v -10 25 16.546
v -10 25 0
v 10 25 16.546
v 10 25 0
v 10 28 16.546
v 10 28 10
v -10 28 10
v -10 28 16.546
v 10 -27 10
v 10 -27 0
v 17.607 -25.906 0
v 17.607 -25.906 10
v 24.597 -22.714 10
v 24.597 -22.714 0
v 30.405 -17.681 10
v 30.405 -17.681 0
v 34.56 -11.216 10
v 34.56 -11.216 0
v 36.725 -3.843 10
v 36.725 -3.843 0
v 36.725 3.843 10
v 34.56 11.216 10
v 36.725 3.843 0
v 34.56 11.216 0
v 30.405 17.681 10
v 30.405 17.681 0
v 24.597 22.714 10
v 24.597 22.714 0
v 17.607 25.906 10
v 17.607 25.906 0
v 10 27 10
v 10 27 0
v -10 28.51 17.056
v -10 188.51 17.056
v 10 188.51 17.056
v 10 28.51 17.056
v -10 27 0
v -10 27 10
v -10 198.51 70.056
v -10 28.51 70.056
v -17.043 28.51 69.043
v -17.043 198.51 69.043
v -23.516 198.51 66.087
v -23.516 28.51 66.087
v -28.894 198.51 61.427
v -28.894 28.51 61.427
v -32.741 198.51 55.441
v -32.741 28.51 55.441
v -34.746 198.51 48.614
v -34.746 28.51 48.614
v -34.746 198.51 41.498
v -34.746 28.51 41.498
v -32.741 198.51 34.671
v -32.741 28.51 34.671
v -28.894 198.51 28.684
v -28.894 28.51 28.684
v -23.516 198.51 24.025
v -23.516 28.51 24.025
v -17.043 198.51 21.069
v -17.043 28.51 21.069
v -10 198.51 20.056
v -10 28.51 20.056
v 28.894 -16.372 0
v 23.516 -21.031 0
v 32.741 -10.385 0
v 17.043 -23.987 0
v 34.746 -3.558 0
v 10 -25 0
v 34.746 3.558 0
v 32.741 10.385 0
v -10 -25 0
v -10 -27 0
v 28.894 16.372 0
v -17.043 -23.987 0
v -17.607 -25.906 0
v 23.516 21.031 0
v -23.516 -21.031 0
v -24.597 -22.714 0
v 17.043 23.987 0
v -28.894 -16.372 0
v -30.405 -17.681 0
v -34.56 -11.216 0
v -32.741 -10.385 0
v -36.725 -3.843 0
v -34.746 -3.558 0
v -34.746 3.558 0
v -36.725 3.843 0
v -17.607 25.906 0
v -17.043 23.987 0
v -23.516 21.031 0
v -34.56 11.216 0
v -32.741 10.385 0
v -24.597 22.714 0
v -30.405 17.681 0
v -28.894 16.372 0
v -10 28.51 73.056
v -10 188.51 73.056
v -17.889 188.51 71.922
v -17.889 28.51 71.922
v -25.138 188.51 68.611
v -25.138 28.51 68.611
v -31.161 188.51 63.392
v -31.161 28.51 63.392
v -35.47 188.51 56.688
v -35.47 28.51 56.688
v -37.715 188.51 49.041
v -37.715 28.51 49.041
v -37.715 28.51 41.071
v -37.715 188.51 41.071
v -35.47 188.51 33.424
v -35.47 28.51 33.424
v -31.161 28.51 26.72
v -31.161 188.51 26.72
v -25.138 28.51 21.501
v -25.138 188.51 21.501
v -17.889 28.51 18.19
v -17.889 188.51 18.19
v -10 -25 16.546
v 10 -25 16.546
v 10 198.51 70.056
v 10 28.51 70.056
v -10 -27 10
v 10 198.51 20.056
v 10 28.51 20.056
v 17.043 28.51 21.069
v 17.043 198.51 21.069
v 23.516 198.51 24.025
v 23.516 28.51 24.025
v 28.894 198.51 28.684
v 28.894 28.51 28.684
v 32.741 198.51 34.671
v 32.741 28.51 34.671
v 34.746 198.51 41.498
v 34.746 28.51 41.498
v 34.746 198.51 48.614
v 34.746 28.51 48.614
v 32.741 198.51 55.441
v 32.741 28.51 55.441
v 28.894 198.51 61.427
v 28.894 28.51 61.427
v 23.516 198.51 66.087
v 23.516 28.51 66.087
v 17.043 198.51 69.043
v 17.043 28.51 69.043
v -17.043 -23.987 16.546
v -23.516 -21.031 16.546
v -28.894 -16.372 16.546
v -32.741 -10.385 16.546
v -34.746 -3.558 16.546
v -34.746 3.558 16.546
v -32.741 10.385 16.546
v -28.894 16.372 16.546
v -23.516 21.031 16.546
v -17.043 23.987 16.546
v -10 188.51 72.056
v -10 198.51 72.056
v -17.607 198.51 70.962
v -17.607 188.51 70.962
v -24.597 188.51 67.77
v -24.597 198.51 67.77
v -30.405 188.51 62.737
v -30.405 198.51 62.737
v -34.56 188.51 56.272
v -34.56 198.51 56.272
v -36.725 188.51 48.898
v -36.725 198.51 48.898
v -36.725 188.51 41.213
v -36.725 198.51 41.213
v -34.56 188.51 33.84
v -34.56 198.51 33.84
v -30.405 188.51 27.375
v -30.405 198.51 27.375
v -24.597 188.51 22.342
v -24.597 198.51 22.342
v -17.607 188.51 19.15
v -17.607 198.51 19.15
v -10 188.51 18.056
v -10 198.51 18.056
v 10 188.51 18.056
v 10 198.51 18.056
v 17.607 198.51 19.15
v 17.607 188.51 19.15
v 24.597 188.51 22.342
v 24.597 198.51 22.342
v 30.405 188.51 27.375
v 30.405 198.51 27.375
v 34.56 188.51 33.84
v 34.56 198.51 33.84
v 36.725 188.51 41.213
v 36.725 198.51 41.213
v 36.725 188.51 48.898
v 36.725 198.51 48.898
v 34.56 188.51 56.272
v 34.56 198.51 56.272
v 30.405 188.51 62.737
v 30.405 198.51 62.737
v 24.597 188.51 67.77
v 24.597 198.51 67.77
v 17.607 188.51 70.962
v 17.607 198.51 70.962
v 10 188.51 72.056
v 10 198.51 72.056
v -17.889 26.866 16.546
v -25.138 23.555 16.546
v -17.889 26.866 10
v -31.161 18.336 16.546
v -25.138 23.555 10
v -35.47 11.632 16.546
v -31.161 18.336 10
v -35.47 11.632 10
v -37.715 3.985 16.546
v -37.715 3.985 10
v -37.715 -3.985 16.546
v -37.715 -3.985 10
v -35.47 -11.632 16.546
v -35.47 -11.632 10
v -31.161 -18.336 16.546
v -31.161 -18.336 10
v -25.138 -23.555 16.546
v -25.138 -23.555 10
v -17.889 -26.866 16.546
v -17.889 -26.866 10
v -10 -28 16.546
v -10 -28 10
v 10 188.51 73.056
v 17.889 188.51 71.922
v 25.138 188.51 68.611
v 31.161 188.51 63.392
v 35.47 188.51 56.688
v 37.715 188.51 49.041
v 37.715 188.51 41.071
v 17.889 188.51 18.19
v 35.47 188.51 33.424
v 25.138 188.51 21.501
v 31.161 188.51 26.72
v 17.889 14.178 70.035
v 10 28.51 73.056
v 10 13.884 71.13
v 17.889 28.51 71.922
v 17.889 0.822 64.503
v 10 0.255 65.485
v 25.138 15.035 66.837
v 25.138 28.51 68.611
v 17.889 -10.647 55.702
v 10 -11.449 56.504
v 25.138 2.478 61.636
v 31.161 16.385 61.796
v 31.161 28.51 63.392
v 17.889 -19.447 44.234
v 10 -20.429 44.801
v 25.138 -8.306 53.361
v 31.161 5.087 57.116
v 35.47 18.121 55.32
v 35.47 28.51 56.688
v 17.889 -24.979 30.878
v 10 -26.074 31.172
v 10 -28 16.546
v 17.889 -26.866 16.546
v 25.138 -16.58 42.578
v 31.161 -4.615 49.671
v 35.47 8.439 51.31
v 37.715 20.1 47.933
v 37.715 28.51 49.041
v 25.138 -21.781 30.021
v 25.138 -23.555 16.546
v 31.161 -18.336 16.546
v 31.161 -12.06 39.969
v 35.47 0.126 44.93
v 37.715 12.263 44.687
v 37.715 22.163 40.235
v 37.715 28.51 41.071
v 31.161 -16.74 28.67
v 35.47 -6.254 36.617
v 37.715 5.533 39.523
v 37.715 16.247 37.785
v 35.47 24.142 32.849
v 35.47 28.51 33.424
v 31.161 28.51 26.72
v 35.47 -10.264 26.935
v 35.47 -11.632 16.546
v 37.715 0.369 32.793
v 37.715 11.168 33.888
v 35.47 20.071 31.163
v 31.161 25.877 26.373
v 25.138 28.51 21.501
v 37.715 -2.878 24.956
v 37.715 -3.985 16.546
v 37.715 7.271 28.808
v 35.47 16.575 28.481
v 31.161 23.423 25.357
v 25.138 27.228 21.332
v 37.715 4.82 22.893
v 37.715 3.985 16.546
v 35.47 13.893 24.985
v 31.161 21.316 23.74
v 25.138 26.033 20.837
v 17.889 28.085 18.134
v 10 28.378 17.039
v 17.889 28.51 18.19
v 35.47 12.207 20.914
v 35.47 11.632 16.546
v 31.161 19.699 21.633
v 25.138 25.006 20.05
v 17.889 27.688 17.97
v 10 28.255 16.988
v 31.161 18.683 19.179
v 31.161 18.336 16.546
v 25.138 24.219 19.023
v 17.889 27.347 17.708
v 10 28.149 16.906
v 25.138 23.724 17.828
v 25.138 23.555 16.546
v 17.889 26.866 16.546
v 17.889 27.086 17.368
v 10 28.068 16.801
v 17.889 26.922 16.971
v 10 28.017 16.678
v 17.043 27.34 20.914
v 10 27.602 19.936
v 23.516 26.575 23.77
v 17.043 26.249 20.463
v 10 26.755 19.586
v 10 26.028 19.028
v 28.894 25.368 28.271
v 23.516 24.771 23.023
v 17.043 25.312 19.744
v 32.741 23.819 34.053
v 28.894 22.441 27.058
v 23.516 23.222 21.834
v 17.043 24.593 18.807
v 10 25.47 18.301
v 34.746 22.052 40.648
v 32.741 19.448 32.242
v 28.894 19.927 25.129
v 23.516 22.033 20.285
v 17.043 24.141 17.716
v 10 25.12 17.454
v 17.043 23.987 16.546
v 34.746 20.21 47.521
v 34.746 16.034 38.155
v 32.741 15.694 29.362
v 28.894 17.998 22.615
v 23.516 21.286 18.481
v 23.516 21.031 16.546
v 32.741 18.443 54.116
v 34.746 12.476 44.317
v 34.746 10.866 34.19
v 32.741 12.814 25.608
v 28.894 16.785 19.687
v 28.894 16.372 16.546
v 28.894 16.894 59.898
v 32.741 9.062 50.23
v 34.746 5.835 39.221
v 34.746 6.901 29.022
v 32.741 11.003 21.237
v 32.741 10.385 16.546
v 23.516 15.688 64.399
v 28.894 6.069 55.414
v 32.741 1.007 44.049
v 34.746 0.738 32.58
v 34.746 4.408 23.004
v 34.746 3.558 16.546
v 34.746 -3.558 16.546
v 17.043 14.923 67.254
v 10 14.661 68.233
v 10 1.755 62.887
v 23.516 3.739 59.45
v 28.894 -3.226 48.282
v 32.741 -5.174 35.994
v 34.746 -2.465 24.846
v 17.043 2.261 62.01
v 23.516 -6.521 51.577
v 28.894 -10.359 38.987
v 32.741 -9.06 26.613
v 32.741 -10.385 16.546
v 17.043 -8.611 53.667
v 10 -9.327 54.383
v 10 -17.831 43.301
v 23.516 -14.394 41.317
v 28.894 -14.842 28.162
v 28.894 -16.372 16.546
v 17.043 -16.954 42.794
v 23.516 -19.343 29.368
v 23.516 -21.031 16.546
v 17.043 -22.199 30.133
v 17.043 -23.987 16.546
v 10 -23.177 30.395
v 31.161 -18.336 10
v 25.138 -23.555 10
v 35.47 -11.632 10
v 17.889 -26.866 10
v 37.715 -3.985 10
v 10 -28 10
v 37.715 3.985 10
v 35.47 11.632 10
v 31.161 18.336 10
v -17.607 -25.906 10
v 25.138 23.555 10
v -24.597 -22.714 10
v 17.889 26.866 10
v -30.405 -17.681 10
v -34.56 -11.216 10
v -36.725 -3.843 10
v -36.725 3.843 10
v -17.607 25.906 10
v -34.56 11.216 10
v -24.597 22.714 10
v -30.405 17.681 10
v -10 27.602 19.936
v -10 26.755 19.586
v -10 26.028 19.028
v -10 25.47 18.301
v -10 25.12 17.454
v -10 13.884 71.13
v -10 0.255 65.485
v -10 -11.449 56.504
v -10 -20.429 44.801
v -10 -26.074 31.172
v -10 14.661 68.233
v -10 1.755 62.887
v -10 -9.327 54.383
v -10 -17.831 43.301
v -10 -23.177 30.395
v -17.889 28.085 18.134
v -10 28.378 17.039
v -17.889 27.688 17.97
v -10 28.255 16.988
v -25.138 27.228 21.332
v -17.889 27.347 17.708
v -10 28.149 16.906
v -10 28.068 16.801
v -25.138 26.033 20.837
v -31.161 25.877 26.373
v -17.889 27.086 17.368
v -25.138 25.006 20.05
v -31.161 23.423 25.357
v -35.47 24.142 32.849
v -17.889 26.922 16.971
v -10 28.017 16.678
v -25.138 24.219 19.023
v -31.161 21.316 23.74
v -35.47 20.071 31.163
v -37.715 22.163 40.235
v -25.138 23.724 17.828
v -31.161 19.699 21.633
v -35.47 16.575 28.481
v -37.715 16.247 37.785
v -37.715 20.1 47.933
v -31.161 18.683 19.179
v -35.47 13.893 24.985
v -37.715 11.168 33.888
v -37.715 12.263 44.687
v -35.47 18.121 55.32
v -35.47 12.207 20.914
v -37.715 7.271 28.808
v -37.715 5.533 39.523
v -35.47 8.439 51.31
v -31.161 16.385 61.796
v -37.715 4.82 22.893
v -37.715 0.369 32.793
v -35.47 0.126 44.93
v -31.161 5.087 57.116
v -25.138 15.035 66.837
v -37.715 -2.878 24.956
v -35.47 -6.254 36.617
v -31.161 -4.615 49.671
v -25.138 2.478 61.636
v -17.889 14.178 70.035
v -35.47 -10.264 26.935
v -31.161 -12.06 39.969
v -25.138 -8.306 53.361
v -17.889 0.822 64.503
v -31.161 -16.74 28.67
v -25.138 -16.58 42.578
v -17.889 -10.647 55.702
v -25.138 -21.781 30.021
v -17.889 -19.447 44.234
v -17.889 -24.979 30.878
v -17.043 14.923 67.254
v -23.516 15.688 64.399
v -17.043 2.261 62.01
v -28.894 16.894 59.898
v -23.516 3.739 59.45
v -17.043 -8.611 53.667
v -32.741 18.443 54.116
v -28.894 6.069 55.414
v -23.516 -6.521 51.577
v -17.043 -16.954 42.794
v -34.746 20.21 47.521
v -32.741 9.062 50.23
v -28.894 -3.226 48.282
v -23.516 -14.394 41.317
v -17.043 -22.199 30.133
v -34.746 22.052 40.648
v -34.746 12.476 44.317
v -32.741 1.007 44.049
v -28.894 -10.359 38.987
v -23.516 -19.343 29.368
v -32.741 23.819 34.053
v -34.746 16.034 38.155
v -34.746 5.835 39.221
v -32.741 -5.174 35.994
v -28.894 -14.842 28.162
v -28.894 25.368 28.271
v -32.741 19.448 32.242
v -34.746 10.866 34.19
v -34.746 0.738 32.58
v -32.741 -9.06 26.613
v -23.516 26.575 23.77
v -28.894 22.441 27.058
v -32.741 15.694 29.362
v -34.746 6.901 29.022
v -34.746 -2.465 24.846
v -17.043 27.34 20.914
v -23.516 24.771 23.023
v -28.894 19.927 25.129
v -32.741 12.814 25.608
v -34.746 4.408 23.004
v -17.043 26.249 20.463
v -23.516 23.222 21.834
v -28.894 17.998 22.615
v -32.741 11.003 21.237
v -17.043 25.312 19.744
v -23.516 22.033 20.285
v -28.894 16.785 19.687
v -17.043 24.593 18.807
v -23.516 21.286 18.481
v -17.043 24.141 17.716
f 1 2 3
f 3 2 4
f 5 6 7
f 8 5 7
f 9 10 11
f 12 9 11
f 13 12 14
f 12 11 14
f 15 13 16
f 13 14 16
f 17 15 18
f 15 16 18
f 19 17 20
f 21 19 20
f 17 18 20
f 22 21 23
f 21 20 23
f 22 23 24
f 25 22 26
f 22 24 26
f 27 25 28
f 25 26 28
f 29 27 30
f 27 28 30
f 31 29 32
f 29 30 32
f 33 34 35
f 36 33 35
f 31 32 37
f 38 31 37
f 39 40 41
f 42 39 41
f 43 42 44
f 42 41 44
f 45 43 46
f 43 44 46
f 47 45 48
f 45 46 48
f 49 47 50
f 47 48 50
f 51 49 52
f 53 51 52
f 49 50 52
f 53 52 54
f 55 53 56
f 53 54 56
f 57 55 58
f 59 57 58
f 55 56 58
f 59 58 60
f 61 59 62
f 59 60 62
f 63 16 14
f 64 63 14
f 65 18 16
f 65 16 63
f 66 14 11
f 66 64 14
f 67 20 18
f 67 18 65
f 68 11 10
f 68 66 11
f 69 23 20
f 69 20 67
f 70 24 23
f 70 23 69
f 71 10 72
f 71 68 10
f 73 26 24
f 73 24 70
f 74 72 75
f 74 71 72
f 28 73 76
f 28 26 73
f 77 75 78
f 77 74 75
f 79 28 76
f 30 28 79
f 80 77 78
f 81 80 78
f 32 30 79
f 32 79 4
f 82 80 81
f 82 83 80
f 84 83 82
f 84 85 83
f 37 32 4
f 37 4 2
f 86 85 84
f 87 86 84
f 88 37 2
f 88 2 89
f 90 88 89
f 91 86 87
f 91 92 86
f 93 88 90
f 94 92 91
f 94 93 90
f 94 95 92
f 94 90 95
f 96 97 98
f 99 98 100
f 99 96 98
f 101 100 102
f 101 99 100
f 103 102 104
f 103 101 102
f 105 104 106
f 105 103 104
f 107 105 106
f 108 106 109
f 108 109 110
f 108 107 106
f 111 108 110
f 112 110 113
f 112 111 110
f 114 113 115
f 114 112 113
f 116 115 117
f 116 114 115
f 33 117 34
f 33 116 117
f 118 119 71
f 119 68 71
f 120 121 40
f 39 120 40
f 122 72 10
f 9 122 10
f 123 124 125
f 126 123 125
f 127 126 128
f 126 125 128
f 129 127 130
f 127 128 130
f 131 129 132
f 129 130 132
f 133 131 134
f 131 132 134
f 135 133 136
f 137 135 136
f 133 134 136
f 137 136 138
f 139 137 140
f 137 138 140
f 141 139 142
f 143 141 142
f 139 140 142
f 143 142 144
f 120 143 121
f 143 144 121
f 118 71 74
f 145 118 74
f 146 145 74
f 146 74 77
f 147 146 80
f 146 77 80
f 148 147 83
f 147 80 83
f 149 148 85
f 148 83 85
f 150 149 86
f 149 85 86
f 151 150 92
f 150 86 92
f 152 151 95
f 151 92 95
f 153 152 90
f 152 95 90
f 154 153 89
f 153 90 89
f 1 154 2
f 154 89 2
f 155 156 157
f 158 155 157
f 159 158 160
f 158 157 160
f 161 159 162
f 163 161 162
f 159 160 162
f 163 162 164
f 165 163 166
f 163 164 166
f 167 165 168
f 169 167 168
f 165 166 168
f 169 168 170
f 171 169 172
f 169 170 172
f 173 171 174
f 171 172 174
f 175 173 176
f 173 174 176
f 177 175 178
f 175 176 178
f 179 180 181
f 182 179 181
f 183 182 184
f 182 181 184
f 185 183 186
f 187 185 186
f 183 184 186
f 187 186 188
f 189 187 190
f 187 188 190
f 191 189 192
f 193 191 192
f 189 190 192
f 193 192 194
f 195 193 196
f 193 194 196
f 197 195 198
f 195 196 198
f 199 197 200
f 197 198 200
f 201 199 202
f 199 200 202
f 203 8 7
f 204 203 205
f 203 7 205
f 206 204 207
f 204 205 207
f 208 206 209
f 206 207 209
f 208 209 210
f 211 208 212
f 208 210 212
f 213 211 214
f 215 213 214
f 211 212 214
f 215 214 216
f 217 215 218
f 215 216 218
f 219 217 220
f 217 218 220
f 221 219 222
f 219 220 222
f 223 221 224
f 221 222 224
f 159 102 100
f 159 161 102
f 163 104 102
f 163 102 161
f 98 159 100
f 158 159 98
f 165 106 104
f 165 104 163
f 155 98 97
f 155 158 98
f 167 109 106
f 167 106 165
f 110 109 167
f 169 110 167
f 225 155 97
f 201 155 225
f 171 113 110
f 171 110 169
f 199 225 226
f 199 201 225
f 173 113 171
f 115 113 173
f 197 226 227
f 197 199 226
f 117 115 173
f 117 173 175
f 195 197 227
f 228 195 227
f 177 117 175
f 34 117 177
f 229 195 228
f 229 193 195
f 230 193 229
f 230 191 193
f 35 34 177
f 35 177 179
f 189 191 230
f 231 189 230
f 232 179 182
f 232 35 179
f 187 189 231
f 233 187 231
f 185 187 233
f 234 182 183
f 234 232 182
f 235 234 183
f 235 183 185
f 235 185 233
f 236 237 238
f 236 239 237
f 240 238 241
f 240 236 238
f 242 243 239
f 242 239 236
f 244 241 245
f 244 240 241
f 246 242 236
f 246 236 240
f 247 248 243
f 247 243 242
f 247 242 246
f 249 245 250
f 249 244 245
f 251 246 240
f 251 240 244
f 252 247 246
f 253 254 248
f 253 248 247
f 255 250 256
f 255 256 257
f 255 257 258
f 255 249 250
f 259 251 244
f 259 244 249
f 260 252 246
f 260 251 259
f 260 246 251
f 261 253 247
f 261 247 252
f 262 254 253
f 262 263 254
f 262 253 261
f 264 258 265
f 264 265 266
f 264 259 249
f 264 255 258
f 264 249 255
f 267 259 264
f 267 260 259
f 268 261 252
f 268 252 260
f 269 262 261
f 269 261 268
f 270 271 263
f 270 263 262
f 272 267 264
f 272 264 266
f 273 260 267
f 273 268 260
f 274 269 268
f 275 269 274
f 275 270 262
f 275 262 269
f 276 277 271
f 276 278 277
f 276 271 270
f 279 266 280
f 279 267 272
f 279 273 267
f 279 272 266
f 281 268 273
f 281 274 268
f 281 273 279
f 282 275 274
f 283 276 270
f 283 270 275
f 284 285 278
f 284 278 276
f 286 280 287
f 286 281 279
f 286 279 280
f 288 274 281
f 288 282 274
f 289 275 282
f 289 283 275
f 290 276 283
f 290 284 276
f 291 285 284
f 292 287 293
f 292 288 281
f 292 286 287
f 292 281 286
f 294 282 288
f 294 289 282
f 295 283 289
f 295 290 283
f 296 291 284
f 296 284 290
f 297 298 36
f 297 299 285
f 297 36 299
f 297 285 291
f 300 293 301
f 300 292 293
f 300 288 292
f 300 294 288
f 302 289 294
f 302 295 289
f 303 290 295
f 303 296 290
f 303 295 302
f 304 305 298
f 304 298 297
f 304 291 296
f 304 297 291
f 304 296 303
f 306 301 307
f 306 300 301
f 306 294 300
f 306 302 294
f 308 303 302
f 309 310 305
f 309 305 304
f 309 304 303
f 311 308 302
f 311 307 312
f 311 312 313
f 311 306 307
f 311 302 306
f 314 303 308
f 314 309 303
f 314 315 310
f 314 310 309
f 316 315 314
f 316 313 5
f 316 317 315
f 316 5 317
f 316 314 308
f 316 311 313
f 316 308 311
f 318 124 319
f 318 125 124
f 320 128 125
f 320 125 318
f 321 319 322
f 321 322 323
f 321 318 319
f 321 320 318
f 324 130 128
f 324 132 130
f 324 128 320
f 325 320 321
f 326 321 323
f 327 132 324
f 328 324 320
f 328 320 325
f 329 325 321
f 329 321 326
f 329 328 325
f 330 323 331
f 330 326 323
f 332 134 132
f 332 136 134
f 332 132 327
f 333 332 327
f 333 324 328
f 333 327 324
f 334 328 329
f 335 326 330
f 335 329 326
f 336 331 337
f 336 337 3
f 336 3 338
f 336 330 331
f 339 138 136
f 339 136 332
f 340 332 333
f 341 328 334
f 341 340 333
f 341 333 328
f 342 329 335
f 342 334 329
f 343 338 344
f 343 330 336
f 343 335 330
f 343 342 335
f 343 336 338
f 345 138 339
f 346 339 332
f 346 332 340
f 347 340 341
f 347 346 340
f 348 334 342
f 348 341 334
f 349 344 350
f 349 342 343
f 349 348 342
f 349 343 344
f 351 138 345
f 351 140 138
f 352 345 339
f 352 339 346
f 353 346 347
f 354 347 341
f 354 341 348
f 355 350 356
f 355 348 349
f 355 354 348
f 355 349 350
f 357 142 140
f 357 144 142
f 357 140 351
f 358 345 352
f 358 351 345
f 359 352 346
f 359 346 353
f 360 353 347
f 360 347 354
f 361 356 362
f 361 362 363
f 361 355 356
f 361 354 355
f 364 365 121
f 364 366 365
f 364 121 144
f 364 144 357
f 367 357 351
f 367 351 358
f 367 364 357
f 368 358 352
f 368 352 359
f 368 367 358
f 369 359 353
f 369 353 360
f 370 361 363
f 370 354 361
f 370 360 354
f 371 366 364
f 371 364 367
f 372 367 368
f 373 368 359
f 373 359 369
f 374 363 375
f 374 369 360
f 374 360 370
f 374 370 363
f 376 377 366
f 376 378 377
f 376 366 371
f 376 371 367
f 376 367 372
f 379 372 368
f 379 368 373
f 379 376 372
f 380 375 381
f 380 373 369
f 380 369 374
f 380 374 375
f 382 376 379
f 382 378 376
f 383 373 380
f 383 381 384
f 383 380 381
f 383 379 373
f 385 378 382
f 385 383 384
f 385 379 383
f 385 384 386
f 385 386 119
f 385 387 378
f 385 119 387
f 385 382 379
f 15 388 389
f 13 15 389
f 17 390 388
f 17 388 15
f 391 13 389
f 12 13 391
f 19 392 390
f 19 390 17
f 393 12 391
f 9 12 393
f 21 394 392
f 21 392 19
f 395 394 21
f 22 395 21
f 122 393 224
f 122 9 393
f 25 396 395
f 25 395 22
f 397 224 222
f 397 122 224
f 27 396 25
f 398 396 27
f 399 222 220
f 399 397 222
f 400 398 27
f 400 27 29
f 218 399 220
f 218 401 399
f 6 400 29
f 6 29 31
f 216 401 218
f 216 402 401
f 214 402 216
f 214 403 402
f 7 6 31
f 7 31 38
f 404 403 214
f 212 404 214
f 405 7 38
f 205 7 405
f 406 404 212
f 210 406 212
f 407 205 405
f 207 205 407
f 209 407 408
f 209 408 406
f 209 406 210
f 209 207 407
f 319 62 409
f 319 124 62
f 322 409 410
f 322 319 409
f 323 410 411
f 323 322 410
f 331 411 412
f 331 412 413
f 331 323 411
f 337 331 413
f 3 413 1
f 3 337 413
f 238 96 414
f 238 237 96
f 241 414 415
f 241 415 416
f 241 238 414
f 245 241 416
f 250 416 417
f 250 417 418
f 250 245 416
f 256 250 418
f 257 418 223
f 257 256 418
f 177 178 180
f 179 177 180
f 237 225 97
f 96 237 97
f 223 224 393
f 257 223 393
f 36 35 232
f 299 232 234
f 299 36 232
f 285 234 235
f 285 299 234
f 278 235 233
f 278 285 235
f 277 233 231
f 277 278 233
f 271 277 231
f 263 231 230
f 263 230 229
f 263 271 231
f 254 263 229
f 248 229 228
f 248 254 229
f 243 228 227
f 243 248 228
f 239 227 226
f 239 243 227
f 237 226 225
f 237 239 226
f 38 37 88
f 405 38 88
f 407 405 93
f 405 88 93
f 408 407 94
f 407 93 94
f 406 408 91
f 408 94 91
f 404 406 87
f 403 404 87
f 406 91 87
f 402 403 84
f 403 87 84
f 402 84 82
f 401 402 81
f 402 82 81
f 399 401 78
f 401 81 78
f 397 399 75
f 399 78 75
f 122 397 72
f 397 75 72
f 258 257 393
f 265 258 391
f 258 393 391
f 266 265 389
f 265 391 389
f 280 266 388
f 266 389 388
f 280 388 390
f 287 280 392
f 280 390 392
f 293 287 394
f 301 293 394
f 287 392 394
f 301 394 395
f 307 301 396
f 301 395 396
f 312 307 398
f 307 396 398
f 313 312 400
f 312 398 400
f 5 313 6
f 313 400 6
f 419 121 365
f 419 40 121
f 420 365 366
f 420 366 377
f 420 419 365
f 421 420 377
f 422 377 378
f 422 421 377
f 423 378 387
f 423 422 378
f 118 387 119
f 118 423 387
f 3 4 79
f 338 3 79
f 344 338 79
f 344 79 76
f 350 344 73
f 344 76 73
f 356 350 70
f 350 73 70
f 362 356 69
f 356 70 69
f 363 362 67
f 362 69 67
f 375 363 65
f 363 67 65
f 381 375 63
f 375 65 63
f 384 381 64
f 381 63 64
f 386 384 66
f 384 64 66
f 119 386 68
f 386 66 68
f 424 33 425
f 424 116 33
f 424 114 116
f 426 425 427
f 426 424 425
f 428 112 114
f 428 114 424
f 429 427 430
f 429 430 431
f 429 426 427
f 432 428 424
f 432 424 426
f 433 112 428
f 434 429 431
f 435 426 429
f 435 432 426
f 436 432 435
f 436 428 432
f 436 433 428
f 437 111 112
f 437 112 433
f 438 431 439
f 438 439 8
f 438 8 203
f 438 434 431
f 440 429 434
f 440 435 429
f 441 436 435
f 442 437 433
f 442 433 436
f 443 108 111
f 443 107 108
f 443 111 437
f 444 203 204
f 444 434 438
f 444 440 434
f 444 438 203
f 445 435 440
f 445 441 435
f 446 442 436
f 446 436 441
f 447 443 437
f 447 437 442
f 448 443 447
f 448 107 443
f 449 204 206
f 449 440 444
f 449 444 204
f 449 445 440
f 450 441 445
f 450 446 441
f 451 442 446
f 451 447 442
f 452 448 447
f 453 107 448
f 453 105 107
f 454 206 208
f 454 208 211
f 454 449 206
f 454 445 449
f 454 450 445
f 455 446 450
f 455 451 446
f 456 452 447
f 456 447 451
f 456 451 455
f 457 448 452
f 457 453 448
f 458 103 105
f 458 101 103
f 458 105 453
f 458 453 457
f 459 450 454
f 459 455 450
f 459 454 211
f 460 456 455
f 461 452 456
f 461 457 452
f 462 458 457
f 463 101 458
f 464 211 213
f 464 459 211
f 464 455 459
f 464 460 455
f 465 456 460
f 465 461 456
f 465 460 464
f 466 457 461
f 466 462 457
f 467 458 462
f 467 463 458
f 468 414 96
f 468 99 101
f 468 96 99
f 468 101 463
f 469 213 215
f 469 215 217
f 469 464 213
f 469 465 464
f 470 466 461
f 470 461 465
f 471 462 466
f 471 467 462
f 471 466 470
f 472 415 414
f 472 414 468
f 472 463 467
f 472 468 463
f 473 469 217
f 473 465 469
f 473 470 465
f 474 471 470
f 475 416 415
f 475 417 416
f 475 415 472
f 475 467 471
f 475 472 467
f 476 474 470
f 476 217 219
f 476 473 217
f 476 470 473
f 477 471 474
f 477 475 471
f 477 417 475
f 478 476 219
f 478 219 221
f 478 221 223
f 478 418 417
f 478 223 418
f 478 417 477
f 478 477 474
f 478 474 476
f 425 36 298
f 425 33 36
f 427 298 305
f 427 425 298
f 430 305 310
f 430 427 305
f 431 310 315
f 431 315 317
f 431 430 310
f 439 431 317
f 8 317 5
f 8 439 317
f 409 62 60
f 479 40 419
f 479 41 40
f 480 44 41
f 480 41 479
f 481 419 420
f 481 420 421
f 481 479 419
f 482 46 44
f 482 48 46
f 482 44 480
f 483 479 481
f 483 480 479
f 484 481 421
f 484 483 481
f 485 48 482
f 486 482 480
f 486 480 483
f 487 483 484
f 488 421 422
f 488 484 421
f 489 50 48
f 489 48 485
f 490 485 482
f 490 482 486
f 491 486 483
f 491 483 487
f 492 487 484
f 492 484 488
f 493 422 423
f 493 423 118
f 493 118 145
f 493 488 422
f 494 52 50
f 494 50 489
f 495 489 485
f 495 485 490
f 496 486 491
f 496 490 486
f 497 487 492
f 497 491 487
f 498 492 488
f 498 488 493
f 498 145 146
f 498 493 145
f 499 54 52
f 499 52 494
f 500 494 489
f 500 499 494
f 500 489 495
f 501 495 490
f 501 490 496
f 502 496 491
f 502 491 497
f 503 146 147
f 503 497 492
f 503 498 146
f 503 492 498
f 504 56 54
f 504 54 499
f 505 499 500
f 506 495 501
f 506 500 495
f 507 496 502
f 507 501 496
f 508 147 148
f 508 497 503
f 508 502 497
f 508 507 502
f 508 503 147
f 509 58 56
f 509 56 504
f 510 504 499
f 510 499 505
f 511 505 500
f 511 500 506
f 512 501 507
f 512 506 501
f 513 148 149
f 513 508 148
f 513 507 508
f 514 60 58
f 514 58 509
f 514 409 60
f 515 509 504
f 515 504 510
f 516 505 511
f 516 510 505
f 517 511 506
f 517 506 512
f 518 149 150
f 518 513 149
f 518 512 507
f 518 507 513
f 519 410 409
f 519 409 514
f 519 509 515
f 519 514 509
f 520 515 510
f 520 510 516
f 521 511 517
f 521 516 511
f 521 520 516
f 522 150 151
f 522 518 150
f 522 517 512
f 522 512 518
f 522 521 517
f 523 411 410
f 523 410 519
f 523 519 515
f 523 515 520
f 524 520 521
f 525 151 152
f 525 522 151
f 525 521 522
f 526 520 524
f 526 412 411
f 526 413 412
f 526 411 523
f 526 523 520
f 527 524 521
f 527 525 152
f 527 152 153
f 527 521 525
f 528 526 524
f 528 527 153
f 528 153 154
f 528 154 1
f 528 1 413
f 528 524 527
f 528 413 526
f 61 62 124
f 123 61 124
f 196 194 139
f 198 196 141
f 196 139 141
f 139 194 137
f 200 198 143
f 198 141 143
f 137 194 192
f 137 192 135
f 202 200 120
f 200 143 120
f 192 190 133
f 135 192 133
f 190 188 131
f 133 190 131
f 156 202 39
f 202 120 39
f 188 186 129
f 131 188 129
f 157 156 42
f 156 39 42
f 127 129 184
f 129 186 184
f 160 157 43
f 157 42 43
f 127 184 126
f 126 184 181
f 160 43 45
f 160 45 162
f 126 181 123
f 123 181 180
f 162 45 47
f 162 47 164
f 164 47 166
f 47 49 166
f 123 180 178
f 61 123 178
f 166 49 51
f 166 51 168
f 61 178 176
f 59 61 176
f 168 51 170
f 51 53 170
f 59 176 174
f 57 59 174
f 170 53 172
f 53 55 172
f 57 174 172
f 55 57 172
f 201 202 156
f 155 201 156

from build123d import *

# Parameters (mm, degrees)
BOSS_EXTRUDE1_DEPTH = 12
SWEEP1_START        = 12
SWEEP1_DEPTH        = 4.545750983
SWEEP1_2_ANGLE      = 90
BOSS_EXTRUDE2_DEPTH = 170
SKETCH11_W          = 78
SKETCH11_H          = 58
CUT_EXTRUDE14_DEPTH = 10
SKETCH12_W          = 78
SKETCH12_H          = 58
CUT_EXTRUDE15_DEPTH = 10


with BuildPart() as part:
    # Sketch1 → Boss-Extrude1 (new body)
    with BuildSketch(Plane.XY):
        with BuildLine():
            Line((10, -28), (-10, -28))
            ThreePointArc((-10, -28), (-38, 0), (-10, 28))
            Line((-10, 28), (10, 28))
            ThreePointArc((10, 28), (38, 0), (10, -28))
        make_face()
        with BuildLine():
            Line((10, -25), (-10, -25))
            ThreePointArc((-10, -25), (-35, 0), (-10, 25))
            Line((-10, 25), (10, 25))
            ThreePointArc((10, 25), (35, 0), (10, -25))
        make_face(mode=Mode.SUBTRACT)
    extrude(amount=BOSS_EXTRUDE1_DEPTH)

    # Sweep1: read off the stored shape, not the designer's step
    # Sweep1 outline → Sweep1 (add)
    with BuildSketch(Plane.XY.offset(SWEEP1_START)):
        with BuildLine():
            ThreePointArc((-10, 28), (-38, 0), (-10, -28))
            Line((-10, -28), (10, -28))
            ThreePointArc((10, -28), (38, 0), (10, 28))
            Line((10, 28), (-10, 28))
        make_face()
        with BuildLine():
            Line((10, -25), (-10, -25))
            ThreePointArc((-10, -25), (-35, 0), (-10, 25))
            Line((-10, 25), (10, 25))
            ThreePointArc((10, 25), (35, 0), (10, -25))
        make_face(mode=Mode.SUBTRACT)
    extrude(amount=SWEEP1_DEPTH)

    # Sweep1 2 outline → Sweep1 2 (revolve)
    with BuildSketch(Plane(origin=(0, 28.510163598, 16.545750983), x_dir=(0, 0, 1), z_dir=(0, 1, 0))):
        with BuildLine():
            Line((0.510163598, 10), (0.510163598, -10))
            ThreePointArc((0.510163598, -10), (28.510163598, -38), (56.510163598, -10))
            Line((56.510163598, -10), (56.510163598, 10))
            ThreePointArc((56.510163598, 10), (28.510163598, 38), (0.510163598, 10))
        make_face()
        with BuildLine():
            Line((3.510163598, -10), (3.510163598, 10))
            ThreePointArc((3.510163598, 10), (28.510163598, 35), (53.510163598, 10))
            Line((53.510163598, 10), (53.510163598, -10))
            ThreePointArc((53.510163598, -10), (28.510163598, -35), (3.510163598, -10))
        make_face(mode=Mode.SUBTRACT)
    revolve(axis=Axis((0, 28.510163598, 16.545750983), (1, 0, 0)), revolution_arc=SWEEP1_2_ANGLE)

    # Sketch6 → Boss-Extrude2 (add)
    with BuildSketch(Plane(origin=(0, 28.510163598, 0), x_dir=(1, 0, 0), z_dir=(0, 1, 0))):
        with BuildLine():
            Line((10, -73.055914581), (-10, -73.055914581))
            ThreePointArc((-10, -73.055914581), (-38, -45.055914581), (-10, -17.055914581))
            Line((-10, -17.055914581), (10, -17.055914581))
            ThreePointArc((10, -17.055914581), (38, -45.055914581), (10, -73.055914581))
        make_face()
        with BuildLine():
            Line((10, -70.055914581), (-10, -70.055914581))
            ThreePointArc((-10, -70.055914581), (-35, -45.055914581), (-10, -20.055914581))
            Line((-10, -20.055914581), (10, -20.055914581))
            ThreePointArc((10, -20.055914581), (35, -45.055914581), (10, -70.055914581))
        make_face(mode=Mode.SUBTRACT)
    extrude(amount=BOSS_EXTRUDE2_DEPTH)

    # Sketch11 → Cut-Extrude14 (cut)
    with BuildSketch(Plane(origin=(0, 0, 0), x_dir=(-1, 0, 0), z_dir=(0, 0, -1))):
        Rectangle(SKETCH11_W, SKETCH11_H)
        with BuildLine():
            Line((10, -27), (-10, -27))
            ThreePointArc((-10, -27), (-37, 0), (-10, 27))
            Line((-10, 27), (10, 27))
            ThreePointArc((10, 27), (37, 0), (10, -27))
        make_face(mode=Mode.SUBTRACT)
    extrude(amount=-CUT_EXTRUDE14_DEPTH, mode=Mode.SUBTRACT)

    # Sketch12 → Cut-Extrude15 (cut)
    with BuildSketch(Plane(origin=(0, 198.510163598, 0), x_dir=(1, 0, 0), z_dir=(0, 1, 0))):
        with Locations((0, -45.055914581)):
            Rectangle(SKETCH12_W, SKETCH12_H)
        with BuildLine():
            Line((10, -72.055914581), (-10, -72.055914581))
            ThreePointArc((-10, -72.055914581), (-37, -45.055914581), (-10, -18.055914581))
            Line((-10, -18.055914581), (10, -18.055914581))
            ThreePointArc((10, -18.055914581), (37, -45.055914581), (10, -72.055914581))
        make_face(mode=Mode.SUBTRACT)
    extrude(amount=-CUT_EXTRUDE15_DEPTH, mode=Mode.SUBTRACT)


solid = part.part
